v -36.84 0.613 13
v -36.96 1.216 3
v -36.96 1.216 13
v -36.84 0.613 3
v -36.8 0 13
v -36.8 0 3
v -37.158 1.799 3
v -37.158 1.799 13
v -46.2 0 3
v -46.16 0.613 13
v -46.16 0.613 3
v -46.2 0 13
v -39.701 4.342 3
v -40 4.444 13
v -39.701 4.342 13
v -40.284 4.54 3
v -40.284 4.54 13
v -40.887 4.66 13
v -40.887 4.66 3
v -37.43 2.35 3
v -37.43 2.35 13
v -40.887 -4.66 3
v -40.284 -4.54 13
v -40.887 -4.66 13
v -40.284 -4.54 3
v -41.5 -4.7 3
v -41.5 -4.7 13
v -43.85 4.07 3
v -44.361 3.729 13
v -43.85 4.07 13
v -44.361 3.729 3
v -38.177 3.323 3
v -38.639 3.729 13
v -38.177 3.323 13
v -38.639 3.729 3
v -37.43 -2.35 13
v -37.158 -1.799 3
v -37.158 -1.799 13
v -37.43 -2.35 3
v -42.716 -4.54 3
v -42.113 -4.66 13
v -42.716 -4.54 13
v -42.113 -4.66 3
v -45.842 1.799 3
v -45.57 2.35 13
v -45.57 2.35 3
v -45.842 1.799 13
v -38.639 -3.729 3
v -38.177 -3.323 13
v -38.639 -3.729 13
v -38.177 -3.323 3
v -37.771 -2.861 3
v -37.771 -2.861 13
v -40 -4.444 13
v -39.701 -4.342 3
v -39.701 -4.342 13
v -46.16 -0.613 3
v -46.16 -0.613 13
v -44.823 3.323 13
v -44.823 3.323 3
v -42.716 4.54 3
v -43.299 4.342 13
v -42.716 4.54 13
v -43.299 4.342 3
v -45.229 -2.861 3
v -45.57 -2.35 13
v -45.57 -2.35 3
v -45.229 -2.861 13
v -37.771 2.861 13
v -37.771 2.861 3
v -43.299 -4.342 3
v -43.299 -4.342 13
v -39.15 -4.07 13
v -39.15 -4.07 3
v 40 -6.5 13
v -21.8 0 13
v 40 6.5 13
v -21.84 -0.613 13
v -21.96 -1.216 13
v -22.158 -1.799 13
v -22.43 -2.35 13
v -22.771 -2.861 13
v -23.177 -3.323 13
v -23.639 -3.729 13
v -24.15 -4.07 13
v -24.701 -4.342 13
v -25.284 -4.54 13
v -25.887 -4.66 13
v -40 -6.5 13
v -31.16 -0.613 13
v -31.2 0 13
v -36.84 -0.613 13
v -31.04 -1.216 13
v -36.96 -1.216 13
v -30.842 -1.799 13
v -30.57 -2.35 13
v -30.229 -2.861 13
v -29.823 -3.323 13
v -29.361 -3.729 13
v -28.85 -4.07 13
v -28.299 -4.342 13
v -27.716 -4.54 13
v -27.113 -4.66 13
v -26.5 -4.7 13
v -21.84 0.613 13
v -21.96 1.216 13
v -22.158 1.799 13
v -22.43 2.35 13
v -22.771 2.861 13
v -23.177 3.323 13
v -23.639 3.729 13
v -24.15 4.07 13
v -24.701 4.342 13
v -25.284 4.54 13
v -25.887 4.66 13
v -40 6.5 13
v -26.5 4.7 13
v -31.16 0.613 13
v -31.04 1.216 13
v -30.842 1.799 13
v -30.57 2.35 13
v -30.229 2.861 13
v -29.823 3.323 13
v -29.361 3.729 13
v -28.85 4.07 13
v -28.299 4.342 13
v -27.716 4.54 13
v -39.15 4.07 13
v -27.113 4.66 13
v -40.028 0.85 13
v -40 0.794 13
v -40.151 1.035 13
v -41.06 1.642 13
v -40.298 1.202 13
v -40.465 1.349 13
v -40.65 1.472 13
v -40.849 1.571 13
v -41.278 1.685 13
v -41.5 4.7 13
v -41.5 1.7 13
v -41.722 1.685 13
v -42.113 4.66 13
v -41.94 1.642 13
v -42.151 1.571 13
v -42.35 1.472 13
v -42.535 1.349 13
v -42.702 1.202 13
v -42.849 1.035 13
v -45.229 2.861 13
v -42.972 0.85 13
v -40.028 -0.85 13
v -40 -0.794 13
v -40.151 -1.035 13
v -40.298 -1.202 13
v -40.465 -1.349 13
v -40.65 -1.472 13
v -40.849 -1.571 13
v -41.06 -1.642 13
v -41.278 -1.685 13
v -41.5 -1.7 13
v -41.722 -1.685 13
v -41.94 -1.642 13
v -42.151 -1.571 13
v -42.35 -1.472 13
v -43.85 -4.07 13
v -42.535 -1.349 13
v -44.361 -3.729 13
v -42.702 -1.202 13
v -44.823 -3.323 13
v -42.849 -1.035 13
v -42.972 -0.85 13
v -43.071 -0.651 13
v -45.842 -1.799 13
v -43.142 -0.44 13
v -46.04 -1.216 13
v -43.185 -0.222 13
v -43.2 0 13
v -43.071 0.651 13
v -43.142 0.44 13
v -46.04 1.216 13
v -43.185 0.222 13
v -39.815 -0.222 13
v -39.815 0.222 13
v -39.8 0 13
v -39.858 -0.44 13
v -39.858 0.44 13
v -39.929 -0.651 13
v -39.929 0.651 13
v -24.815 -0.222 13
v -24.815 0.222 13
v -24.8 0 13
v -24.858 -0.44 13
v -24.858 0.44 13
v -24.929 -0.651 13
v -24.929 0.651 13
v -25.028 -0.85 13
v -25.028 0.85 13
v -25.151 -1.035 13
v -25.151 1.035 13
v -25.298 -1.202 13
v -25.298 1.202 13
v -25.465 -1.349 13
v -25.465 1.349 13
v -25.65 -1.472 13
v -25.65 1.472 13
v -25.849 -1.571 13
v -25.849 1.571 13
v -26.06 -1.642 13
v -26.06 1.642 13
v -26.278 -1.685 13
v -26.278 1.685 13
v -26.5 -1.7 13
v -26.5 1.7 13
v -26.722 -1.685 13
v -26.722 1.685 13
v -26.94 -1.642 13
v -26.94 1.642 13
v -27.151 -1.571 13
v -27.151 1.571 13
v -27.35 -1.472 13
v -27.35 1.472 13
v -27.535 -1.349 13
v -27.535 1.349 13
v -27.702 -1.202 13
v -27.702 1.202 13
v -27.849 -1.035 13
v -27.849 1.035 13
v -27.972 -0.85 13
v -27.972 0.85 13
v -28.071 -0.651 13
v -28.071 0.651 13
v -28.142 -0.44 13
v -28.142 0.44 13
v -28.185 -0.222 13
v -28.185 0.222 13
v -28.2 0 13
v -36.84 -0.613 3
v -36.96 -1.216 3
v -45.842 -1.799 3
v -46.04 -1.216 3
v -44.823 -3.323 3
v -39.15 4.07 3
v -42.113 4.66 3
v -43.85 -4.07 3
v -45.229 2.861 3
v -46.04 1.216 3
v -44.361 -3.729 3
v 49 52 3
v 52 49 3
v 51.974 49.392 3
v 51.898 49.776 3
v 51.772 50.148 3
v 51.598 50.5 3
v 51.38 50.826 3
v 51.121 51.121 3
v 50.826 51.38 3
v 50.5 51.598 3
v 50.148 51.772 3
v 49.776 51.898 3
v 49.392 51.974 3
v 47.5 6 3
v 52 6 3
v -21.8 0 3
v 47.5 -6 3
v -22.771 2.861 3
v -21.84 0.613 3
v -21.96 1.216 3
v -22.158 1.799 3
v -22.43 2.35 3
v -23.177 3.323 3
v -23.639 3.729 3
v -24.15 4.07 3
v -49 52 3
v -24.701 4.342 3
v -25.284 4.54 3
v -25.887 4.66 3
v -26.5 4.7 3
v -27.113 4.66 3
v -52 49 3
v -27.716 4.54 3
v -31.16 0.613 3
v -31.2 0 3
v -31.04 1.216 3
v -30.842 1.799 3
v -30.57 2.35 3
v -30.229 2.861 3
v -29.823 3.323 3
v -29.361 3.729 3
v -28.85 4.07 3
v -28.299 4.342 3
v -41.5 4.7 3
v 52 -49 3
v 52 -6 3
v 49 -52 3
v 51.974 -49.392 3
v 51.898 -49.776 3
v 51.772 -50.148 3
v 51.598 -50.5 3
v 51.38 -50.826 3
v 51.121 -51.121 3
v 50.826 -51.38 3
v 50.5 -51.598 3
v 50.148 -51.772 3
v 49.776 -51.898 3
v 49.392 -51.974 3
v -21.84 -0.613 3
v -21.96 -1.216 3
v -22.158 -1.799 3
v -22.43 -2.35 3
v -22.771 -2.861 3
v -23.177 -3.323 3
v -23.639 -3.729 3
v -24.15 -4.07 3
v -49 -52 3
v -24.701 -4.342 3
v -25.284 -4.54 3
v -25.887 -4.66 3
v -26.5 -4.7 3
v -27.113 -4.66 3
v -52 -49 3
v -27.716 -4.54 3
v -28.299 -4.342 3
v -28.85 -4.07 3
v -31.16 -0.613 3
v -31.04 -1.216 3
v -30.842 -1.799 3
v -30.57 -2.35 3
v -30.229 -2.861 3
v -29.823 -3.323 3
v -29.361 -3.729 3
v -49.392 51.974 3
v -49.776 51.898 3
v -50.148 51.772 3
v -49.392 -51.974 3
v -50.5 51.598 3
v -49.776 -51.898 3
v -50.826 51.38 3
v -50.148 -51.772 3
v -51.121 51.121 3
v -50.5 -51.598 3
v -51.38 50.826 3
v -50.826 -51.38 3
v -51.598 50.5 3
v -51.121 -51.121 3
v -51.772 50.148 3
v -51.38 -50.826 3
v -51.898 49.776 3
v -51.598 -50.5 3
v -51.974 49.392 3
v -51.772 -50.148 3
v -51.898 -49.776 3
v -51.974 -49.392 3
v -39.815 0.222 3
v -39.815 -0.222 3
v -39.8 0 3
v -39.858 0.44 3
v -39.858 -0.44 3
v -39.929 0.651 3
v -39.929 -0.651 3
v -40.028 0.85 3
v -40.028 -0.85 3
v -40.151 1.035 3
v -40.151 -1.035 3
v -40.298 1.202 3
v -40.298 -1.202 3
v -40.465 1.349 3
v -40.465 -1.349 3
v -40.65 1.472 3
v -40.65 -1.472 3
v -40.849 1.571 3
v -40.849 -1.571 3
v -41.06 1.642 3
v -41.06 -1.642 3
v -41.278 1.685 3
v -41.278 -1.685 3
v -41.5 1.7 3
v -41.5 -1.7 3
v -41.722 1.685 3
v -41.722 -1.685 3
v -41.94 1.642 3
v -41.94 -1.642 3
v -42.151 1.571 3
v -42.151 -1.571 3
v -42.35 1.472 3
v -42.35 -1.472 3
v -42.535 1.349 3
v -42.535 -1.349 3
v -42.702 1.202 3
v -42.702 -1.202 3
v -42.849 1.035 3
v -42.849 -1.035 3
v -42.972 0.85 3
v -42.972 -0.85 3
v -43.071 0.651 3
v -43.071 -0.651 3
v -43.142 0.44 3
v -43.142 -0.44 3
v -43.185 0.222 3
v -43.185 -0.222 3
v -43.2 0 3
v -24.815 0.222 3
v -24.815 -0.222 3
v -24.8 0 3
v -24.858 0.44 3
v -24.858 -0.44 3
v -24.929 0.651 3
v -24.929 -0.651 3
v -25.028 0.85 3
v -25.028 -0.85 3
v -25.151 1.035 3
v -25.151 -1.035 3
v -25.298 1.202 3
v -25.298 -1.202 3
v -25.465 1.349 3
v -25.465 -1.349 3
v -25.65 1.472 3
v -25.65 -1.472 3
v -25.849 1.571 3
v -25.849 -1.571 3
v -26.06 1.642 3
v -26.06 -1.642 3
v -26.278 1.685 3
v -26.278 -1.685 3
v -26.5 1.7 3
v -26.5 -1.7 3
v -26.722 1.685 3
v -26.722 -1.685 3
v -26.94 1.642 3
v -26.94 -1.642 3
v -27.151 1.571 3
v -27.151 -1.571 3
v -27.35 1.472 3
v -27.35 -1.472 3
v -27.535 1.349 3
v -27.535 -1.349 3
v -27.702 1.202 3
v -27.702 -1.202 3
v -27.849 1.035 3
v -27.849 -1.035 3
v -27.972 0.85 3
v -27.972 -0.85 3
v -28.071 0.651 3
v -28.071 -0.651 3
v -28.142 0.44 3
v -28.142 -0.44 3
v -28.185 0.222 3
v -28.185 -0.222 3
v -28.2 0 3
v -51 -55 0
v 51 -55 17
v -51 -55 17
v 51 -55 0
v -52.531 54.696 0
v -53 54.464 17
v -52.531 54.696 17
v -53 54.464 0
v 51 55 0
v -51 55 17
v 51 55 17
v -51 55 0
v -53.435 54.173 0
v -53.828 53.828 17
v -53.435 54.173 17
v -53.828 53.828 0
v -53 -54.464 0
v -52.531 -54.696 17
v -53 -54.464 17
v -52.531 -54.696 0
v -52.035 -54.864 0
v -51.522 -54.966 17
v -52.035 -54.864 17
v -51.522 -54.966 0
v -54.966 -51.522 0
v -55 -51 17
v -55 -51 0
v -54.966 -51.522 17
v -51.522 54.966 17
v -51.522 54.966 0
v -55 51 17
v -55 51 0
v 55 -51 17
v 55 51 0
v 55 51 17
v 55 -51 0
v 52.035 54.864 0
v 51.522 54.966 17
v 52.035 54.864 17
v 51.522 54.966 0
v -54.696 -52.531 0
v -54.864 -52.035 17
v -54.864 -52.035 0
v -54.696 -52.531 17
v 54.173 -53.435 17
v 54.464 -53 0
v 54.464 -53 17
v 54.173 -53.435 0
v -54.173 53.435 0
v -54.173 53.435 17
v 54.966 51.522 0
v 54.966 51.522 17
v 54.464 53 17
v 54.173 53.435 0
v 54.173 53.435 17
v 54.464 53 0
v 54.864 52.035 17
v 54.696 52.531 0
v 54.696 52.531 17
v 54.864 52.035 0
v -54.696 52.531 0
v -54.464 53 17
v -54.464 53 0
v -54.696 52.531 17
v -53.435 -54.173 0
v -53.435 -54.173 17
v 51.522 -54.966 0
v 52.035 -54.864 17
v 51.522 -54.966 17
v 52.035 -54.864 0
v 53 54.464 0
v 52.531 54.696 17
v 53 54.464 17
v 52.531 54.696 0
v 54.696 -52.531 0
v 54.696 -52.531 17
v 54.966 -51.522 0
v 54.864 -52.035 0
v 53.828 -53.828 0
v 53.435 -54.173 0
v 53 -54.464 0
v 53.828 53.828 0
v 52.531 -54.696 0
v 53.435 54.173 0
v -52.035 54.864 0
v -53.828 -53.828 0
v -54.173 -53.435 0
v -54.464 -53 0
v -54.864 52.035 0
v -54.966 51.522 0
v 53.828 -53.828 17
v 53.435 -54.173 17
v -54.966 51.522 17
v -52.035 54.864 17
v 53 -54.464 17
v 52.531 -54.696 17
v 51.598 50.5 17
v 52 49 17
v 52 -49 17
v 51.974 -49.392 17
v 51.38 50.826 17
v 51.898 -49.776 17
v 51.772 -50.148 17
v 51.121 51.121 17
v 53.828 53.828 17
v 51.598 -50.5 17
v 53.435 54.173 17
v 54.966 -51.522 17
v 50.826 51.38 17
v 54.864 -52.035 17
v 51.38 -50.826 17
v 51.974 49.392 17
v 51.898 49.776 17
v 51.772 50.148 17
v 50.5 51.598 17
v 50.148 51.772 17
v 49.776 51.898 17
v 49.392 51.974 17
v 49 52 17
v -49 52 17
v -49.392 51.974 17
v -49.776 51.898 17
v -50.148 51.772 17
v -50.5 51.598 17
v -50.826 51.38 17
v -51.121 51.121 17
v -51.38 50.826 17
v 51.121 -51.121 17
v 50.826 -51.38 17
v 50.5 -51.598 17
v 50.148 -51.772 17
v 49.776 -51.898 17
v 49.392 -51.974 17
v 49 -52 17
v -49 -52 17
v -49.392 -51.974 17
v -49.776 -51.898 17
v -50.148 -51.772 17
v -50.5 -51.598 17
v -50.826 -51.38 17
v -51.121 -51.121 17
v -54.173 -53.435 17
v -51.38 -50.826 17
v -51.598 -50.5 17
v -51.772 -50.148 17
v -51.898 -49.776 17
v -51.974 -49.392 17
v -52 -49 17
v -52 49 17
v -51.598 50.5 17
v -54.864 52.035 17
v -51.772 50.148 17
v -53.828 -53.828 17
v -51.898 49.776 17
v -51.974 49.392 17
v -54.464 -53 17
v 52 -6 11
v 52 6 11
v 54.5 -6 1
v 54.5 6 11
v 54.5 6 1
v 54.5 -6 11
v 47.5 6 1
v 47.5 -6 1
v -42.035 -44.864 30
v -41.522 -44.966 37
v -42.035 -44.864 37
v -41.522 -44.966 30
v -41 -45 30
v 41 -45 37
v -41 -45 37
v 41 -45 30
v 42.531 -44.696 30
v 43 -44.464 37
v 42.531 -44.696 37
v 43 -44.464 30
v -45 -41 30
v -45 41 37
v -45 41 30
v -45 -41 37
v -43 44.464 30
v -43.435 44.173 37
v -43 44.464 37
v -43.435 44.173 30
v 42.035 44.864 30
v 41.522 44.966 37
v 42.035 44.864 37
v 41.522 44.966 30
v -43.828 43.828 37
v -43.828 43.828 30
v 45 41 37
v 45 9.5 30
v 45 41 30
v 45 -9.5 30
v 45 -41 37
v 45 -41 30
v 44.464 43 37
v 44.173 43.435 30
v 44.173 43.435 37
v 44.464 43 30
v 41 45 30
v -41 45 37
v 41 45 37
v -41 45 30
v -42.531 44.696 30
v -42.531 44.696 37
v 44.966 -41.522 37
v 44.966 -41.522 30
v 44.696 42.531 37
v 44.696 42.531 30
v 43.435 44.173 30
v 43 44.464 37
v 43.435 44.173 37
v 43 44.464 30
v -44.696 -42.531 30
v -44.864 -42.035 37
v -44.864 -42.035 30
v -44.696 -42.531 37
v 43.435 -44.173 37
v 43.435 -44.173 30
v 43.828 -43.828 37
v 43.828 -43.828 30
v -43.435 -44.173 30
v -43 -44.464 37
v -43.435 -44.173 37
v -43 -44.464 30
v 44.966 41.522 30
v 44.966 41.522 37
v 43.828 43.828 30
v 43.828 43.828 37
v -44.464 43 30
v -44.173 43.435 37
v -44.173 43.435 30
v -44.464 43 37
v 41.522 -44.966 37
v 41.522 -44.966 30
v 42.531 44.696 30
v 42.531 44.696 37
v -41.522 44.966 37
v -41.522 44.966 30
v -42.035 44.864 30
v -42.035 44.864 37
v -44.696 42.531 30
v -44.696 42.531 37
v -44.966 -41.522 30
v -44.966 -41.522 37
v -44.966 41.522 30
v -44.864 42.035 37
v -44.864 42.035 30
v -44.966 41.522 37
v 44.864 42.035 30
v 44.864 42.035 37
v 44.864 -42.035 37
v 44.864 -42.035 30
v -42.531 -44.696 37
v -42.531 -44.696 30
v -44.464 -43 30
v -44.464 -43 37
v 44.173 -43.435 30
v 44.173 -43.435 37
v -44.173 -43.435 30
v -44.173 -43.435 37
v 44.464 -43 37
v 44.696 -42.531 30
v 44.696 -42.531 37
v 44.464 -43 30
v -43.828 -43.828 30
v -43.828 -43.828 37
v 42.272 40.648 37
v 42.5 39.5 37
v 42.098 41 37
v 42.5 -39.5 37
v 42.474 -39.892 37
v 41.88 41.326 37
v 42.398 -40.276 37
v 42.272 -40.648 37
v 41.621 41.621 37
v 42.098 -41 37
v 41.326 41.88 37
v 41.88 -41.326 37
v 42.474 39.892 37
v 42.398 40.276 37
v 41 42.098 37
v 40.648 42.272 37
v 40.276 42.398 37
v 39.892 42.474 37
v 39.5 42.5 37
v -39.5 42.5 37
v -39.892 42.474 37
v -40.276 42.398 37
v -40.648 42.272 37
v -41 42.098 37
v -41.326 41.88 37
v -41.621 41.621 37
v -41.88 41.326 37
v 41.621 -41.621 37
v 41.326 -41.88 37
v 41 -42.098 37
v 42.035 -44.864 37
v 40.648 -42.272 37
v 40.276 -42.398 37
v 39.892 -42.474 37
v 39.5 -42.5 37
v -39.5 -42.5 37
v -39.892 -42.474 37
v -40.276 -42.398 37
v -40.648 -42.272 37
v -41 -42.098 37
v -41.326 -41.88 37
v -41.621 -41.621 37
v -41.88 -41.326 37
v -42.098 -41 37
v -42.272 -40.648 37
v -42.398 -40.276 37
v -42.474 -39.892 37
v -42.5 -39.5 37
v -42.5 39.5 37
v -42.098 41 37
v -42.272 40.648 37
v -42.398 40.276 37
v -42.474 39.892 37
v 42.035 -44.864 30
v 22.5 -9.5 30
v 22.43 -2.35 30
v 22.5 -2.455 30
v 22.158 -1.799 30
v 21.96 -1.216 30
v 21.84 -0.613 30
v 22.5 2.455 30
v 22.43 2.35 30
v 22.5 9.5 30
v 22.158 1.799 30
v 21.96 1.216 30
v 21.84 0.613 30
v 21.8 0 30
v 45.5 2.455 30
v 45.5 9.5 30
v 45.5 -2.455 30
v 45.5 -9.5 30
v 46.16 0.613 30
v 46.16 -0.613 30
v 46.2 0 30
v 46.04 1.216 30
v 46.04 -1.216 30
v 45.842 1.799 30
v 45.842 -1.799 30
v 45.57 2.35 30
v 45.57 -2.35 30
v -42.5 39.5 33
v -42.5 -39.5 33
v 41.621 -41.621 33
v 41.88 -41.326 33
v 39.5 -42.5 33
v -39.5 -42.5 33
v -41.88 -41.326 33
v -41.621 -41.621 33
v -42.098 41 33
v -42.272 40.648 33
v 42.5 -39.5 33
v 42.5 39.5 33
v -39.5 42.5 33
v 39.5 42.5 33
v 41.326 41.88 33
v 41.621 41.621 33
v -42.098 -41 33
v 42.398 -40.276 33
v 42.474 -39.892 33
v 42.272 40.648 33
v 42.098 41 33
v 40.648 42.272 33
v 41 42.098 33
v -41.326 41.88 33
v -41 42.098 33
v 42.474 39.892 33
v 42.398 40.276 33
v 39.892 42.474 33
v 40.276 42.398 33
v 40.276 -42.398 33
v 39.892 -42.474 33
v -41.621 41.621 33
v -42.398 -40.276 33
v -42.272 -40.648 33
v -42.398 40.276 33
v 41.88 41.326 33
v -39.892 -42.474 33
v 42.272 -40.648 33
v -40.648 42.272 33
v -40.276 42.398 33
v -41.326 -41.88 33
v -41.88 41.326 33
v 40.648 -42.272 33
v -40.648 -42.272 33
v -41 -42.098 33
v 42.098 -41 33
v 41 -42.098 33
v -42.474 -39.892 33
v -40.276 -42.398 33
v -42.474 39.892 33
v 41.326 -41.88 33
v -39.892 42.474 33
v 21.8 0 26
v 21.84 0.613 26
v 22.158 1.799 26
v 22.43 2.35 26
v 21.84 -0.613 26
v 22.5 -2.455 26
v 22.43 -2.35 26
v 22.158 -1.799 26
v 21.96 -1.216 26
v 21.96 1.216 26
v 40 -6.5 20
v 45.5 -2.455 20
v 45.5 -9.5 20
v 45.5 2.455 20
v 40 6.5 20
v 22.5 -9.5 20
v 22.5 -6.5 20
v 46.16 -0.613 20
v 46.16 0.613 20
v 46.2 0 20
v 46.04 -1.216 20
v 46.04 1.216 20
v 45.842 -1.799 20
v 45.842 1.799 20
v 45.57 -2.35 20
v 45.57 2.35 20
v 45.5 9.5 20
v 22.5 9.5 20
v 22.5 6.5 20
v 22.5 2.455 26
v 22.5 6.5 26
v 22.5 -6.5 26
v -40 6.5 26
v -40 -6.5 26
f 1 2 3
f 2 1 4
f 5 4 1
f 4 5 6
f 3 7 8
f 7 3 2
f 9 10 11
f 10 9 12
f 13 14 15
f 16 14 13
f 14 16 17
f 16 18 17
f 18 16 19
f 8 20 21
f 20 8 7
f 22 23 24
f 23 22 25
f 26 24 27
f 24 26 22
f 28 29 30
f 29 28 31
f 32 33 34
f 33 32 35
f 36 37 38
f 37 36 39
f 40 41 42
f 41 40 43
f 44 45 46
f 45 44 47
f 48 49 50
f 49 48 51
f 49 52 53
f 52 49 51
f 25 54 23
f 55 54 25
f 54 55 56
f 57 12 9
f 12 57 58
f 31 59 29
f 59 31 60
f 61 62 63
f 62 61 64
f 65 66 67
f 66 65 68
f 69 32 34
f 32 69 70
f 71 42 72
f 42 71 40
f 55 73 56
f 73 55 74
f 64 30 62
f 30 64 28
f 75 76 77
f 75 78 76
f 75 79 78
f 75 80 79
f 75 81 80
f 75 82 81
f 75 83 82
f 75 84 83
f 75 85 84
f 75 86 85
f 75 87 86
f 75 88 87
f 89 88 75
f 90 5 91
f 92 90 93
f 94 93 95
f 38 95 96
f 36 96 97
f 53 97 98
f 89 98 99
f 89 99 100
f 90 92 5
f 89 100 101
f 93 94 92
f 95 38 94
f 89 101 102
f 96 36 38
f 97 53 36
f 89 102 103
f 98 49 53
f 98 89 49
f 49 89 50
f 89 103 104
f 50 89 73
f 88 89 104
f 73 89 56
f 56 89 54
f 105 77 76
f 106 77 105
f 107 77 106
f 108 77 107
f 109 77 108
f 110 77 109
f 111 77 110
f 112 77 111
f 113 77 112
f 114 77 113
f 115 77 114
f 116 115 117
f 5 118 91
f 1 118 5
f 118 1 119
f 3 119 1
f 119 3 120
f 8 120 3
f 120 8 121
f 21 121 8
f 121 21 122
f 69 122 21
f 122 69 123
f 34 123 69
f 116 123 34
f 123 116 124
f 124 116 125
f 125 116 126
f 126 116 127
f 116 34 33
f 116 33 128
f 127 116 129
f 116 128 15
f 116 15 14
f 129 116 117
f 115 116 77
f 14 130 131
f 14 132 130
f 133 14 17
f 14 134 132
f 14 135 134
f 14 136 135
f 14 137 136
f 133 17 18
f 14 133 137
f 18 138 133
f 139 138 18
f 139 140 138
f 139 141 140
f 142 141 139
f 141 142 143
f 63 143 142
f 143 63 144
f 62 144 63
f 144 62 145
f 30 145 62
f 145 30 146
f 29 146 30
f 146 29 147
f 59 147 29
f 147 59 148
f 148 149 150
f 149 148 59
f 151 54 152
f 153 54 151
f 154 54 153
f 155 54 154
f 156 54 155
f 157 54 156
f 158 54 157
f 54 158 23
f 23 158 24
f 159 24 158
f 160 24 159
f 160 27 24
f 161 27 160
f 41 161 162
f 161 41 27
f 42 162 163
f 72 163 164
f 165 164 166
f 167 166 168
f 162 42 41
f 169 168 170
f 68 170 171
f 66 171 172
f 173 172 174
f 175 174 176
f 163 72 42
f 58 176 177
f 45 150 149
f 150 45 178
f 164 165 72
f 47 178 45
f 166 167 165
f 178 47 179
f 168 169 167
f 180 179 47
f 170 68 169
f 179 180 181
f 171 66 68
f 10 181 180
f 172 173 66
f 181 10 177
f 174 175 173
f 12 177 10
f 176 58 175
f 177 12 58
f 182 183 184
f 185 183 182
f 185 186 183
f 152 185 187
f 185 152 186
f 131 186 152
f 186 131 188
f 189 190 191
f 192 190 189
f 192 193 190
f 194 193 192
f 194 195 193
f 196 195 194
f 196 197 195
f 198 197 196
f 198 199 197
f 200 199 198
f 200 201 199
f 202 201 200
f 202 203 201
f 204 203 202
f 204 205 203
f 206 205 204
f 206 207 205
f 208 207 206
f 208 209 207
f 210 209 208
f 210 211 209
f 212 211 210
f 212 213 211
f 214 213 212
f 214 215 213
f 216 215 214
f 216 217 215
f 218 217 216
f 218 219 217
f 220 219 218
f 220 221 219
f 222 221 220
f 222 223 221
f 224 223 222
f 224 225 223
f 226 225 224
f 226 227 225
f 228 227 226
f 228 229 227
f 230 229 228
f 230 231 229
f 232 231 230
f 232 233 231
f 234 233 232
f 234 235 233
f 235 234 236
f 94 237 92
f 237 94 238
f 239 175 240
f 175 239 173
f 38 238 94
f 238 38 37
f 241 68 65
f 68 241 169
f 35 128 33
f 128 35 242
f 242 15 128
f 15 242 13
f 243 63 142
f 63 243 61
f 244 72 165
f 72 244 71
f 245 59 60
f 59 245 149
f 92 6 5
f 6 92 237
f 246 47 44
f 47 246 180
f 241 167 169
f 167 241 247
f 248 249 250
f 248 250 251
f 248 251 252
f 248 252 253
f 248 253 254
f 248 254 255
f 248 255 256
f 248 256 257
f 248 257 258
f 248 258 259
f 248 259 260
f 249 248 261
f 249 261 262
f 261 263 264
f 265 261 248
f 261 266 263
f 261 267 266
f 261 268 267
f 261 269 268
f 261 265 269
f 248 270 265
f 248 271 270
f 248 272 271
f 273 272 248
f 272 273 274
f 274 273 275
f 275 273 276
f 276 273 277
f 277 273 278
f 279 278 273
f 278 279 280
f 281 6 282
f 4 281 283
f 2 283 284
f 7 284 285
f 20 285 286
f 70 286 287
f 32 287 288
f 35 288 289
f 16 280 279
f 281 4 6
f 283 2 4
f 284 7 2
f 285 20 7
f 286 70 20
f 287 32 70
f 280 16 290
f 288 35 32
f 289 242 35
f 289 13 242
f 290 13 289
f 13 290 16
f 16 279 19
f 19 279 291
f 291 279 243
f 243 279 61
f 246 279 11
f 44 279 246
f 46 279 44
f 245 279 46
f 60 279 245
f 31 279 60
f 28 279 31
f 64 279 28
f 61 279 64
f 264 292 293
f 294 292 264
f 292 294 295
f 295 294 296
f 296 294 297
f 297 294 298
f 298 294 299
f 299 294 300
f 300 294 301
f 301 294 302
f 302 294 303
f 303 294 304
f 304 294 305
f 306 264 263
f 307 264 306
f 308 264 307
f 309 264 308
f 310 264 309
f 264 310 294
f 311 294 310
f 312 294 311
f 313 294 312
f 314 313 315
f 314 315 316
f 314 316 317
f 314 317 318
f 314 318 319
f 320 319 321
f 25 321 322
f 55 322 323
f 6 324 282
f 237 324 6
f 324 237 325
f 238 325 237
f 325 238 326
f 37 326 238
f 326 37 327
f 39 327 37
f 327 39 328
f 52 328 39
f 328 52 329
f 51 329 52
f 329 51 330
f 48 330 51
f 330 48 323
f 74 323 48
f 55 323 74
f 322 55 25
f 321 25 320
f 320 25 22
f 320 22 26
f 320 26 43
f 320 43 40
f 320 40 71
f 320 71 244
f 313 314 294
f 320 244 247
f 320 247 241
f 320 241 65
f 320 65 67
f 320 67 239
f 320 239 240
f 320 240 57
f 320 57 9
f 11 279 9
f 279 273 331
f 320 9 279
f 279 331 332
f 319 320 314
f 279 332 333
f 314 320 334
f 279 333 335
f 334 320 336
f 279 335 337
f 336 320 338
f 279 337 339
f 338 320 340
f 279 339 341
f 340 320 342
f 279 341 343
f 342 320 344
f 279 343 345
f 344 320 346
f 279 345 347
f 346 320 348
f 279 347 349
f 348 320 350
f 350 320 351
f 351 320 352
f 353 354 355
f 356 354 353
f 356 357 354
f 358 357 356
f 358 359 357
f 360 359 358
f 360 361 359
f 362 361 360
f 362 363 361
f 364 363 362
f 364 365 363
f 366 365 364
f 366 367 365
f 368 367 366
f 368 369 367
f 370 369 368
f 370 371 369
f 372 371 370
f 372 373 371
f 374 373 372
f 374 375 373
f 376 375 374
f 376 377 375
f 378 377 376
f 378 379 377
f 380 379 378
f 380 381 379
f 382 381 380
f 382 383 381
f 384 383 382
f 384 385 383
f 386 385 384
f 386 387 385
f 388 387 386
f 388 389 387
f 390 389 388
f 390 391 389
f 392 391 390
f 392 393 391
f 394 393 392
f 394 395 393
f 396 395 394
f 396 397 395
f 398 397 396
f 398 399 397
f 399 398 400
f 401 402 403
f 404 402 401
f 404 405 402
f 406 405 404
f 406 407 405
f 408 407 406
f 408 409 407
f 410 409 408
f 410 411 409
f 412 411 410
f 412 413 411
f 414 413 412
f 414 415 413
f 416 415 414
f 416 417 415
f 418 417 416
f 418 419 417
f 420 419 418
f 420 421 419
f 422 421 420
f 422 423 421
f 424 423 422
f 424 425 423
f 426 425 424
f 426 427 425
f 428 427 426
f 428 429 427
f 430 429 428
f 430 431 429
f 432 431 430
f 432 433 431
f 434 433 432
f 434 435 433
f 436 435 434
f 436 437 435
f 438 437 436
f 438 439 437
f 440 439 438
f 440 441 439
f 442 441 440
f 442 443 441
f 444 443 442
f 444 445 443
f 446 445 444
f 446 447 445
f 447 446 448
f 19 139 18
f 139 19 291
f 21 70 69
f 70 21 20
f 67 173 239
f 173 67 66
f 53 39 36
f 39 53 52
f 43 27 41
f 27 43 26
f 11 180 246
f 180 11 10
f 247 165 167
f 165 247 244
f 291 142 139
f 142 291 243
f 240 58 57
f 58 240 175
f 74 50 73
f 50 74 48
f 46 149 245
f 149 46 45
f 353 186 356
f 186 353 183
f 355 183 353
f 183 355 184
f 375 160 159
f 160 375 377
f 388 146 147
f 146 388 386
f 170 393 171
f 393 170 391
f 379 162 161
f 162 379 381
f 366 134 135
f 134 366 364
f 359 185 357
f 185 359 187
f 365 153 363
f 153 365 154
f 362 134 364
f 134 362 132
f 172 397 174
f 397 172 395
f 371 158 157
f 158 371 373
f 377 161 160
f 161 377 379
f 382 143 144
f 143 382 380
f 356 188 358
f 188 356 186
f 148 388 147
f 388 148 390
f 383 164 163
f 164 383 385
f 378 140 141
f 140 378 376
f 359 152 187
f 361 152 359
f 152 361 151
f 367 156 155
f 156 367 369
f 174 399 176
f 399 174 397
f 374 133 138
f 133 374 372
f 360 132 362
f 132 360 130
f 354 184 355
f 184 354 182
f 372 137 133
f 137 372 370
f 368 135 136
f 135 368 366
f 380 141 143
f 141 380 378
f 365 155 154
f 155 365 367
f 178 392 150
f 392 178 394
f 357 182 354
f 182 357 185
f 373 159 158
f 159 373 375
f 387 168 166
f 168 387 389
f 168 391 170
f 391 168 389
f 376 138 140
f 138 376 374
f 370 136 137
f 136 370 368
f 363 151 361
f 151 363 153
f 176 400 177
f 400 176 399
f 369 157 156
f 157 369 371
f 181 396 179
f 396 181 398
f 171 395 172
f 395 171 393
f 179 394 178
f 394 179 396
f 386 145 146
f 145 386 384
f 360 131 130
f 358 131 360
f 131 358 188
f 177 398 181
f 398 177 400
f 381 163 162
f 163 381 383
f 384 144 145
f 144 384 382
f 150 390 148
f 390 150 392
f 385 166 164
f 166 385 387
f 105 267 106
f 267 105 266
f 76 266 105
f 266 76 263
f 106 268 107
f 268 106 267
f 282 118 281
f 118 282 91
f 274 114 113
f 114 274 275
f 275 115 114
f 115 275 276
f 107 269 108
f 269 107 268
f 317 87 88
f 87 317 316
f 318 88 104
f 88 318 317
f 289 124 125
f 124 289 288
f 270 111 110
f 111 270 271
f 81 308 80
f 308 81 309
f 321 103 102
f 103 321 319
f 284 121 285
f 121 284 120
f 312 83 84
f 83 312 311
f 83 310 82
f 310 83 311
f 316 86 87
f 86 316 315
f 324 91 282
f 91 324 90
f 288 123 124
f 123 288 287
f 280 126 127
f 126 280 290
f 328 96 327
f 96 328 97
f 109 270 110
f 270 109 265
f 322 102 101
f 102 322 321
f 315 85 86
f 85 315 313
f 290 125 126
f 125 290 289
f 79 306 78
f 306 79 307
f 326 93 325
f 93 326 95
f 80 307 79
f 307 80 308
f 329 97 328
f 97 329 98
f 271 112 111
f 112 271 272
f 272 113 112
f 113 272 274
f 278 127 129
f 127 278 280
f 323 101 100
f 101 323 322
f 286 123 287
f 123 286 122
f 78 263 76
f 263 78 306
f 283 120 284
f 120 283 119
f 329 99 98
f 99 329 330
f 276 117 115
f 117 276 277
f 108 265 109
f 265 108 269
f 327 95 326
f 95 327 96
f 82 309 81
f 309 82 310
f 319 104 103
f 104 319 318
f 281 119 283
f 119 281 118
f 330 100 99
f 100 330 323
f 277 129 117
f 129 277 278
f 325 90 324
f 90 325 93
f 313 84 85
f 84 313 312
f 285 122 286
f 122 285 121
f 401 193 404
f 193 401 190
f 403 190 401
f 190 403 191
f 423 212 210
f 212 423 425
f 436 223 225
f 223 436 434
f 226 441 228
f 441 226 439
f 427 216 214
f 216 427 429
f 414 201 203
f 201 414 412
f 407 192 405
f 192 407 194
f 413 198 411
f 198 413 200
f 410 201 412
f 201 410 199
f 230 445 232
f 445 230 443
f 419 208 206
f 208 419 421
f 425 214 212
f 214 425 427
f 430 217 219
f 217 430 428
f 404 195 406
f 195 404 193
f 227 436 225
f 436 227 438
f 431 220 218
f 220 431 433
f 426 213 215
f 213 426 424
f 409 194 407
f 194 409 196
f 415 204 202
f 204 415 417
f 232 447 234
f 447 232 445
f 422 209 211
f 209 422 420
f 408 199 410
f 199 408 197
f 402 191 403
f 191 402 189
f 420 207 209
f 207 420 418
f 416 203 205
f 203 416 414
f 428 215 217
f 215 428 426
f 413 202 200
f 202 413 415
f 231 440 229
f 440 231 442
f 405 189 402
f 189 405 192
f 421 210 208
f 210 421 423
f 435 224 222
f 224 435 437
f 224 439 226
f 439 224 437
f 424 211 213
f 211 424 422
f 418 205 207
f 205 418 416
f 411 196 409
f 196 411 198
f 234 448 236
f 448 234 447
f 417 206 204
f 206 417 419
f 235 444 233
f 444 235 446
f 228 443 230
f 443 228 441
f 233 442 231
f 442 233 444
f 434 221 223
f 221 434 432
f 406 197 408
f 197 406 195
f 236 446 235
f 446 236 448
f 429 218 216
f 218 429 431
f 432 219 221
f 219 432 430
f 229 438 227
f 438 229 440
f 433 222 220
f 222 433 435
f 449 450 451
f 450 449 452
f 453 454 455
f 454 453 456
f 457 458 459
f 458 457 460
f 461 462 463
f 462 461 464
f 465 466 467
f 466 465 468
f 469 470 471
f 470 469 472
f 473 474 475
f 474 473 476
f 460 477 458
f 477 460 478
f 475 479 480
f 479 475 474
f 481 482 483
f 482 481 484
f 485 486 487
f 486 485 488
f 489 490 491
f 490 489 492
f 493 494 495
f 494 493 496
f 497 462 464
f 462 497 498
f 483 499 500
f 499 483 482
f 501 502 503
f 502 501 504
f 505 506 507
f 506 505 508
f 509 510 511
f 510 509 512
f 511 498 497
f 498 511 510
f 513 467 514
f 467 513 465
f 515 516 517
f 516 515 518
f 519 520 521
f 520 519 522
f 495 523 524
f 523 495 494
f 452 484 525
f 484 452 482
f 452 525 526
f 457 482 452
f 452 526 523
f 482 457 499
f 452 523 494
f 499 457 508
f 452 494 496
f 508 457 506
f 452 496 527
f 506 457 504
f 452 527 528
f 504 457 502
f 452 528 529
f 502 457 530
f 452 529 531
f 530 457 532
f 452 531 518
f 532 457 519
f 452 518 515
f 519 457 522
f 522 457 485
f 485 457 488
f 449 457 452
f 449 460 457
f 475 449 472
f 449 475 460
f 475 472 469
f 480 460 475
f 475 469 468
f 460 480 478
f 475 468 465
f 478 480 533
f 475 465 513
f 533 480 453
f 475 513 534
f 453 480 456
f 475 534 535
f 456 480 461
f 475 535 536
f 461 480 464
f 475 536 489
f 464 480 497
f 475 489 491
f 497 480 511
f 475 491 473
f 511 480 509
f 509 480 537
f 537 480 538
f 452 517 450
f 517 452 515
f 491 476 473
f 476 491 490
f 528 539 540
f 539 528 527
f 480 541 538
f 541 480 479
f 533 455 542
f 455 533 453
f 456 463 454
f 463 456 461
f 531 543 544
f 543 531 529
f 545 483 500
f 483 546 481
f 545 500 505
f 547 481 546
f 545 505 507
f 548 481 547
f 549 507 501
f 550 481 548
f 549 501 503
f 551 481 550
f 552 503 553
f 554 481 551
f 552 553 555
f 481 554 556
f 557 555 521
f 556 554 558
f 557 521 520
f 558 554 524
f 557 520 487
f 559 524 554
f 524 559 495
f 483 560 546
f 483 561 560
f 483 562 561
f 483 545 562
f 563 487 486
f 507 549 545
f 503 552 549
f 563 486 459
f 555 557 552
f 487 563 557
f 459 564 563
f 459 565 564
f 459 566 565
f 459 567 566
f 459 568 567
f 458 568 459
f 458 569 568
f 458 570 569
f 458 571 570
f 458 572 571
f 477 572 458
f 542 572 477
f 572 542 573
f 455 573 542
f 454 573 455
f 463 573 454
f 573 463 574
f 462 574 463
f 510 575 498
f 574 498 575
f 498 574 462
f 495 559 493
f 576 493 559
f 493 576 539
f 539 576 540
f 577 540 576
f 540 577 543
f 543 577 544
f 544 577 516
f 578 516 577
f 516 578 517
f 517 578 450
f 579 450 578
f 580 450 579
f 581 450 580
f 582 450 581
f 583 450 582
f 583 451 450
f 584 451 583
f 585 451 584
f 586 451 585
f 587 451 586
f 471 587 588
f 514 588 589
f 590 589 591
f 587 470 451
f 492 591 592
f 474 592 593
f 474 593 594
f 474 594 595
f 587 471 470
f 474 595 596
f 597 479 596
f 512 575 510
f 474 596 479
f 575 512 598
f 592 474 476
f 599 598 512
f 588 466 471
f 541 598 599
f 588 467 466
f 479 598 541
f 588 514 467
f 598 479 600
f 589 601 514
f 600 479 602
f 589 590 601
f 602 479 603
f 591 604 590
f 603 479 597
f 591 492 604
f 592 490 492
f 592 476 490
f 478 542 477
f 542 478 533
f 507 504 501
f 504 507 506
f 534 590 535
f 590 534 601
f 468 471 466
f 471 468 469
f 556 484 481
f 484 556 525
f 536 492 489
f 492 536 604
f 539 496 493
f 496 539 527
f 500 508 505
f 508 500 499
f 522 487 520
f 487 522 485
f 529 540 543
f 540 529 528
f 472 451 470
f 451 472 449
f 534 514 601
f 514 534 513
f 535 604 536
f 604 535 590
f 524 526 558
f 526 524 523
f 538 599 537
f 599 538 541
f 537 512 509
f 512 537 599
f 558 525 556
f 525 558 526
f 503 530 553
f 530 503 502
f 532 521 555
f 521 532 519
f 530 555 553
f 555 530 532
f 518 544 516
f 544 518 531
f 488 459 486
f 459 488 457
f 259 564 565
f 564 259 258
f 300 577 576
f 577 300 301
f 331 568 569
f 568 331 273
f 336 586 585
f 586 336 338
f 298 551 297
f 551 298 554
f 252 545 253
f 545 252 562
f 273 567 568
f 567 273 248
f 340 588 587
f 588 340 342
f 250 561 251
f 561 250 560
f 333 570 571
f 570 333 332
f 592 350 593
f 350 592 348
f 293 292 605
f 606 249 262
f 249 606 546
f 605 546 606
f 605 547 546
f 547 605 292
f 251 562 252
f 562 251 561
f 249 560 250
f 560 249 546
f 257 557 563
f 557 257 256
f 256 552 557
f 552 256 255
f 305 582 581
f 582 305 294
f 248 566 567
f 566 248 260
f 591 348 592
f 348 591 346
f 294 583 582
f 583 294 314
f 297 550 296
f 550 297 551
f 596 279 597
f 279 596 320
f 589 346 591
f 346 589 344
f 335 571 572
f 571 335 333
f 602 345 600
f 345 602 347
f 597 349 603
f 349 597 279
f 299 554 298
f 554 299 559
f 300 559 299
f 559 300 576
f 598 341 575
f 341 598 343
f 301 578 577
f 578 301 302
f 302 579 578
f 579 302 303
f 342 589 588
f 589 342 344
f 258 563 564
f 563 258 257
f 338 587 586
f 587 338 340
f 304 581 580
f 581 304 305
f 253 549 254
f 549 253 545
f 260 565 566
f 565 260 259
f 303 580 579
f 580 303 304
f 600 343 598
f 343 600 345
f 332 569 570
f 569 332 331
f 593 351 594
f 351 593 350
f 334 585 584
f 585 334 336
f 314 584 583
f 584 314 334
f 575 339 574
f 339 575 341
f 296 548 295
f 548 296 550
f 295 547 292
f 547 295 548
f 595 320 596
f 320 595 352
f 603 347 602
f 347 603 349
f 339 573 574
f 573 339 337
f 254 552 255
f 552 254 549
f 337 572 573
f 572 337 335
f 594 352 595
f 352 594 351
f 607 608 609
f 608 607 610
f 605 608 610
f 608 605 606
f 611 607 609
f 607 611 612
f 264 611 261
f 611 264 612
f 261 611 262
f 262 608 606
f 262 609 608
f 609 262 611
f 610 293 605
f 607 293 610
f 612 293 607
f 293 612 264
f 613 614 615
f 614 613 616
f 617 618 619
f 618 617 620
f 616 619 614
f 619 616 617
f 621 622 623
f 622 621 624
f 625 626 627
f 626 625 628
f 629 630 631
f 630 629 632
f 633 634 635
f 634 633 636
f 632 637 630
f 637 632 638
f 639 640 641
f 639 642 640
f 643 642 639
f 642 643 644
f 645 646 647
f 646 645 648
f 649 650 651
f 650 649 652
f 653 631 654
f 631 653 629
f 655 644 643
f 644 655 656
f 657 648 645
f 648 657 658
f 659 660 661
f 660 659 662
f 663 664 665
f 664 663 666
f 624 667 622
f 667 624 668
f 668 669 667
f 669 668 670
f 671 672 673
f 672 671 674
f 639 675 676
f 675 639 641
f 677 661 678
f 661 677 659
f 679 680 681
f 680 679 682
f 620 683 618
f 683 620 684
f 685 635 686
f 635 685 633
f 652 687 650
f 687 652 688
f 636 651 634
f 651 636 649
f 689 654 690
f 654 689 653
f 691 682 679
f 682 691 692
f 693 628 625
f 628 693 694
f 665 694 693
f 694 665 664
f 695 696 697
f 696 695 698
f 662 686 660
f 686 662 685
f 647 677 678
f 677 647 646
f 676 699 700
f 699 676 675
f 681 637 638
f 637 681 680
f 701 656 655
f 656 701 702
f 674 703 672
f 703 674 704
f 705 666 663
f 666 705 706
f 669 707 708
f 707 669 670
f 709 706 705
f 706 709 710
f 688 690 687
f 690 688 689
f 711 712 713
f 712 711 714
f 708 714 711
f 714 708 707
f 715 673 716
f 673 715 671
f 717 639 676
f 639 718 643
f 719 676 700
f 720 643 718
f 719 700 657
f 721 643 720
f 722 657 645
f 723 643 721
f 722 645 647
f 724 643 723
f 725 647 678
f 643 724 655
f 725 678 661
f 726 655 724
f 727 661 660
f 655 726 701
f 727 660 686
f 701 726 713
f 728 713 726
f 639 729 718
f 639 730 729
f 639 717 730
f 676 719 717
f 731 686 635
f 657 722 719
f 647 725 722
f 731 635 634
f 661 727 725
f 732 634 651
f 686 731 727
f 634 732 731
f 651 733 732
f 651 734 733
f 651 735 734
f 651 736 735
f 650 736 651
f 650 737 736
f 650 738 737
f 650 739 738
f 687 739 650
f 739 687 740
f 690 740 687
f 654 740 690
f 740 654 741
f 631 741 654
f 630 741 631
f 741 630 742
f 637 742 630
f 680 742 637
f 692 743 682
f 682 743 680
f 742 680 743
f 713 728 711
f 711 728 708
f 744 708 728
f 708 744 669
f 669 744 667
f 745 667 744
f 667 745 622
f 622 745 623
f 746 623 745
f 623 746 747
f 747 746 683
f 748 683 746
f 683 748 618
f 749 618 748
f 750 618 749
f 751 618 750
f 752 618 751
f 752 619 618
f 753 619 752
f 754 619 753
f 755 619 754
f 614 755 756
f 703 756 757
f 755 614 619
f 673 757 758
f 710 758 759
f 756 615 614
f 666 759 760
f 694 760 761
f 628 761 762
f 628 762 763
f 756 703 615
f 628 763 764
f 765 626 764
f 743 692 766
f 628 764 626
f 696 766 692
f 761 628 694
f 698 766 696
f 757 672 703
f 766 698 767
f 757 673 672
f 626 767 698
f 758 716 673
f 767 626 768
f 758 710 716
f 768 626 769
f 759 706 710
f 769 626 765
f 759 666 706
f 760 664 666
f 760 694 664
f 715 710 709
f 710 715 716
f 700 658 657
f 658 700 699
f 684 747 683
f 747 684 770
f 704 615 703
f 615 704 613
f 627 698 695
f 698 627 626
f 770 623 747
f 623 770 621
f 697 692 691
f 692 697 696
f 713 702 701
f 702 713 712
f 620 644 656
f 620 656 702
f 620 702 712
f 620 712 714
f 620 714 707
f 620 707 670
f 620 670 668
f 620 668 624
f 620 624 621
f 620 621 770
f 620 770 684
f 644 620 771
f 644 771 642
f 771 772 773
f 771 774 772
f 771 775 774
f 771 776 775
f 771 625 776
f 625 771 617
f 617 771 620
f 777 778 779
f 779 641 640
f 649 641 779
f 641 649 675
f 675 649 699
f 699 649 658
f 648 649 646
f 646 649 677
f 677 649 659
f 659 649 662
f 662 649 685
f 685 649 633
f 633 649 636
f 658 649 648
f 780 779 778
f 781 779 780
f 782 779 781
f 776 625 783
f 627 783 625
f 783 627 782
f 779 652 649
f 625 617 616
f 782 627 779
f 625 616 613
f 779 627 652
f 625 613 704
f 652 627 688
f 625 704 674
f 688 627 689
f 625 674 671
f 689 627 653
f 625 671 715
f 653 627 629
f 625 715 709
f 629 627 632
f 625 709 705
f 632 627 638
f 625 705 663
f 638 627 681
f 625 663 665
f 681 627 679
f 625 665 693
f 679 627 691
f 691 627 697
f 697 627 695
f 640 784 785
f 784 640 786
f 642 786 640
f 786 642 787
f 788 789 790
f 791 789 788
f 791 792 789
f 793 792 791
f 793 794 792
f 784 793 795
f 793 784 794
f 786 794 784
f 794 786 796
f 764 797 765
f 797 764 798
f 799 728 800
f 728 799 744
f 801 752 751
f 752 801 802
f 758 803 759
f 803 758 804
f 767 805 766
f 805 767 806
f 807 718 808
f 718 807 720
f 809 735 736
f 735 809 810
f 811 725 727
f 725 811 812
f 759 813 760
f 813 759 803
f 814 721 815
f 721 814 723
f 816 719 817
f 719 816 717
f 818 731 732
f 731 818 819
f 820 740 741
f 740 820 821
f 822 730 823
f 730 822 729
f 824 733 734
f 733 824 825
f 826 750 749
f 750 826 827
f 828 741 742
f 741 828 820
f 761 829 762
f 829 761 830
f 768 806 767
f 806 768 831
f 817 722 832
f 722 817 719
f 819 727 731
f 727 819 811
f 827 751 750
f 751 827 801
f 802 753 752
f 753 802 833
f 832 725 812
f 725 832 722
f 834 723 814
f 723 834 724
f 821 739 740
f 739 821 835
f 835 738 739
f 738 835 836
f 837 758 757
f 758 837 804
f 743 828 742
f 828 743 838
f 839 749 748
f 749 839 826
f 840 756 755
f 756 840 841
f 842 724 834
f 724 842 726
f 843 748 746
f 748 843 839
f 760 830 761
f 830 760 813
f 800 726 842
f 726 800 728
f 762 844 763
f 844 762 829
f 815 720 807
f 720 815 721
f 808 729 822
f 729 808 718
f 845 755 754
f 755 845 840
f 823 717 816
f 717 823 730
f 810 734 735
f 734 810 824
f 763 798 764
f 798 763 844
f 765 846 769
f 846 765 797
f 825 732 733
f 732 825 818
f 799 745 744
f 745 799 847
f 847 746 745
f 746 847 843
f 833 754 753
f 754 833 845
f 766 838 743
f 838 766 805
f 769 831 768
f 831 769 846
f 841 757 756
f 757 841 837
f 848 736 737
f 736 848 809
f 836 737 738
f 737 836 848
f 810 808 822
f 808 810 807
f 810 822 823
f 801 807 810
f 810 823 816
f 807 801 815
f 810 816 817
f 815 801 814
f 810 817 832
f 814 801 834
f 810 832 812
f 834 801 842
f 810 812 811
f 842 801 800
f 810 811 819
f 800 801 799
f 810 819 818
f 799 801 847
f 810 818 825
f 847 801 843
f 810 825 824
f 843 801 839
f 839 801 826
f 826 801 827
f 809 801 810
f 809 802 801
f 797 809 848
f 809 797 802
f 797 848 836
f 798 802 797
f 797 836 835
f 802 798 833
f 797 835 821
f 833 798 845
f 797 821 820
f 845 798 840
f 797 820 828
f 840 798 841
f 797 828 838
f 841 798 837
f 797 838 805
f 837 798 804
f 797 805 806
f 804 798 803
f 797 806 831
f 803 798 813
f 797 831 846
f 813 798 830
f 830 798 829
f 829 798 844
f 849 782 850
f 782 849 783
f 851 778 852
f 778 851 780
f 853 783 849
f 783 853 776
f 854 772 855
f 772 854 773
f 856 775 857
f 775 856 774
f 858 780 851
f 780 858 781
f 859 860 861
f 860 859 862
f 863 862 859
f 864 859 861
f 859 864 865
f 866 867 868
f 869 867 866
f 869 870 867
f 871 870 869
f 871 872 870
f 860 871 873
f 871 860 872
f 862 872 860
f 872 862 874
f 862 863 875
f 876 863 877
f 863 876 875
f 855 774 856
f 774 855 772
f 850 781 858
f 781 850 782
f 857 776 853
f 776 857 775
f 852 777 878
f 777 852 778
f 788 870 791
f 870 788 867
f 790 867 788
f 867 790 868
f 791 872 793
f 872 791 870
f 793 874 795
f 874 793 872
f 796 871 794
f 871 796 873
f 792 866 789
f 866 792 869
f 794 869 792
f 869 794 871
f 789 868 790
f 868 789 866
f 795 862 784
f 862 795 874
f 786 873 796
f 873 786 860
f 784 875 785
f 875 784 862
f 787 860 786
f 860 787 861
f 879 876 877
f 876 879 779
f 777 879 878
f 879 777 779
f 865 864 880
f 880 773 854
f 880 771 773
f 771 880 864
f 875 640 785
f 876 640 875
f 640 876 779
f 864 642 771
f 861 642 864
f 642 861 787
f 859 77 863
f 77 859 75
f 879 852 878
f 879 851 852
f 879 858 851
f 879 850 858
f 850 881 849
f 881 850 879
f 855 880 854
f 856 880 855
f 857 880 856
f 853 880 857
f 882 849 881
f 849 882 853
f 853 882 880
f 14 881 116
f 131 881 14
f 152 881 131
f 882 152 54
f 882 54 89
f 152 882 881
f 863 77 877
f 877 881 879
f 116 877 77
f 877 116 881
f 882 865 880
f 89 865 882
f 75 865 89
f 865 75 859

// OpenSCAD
// =============================================================================
// Bottle Feed Logger — load-cell stand (parametric starter)
//
// Two parts: BASE (fixed end of the load cell + electronics) and
// PLATFORM (free end of the load cell; the bottle sits here).
// The load cell is mounted CANTILEVER-style with an air gap so it can flex.
//
// HOW TO USE:
//   1. Measure your load cell and set the parameters below.
//   2. Set part = "base" or "platform" (or "preview" to see both).
//   3. Render (F6) and export each STL.
//
// This is a starting point — tweak to fit your exact cell and bottle.
// The critical requirement is the AIR GAP so the cell can bend.
// See hardware/assembly.md.
// =============================================================================

// ---------------- WHICH PART TO RENDER ----------------
part = "preview";   // "base", "platform", or "preview"

// ---------------- LOAD CELL DIMENSIONS (MEASURE YOURS) ----------------
cell_length       = 80;   // mm, length of the bar
cell_width        = 13;   // mm
cell_height       = 13;   // mm
cell_hole_spacing = 15;   // mm, distance between the two holes at EACH end
cell_hole_dia     = 3.4;  // mm, screw clearance (kit uses M3 -> 3.4; M4 ~4.5, M5 ~5.5)
cell_end_inset    = 6;    // mm, how far the hole centers sit from each end

// ---------------- STAND DIMENSIONS ----------------
platform_size = 90;   // mm, square top the bottle sits on
base_size     = 110;  // mm, square footprint of the base
wall          = 3;    // mm
base_floor    = 3;    // mm
boss_h        = 10;   // mm, height of the mounting bosses under each cell end
air_gap       = 4;    // mm, clearance under the free (platform) end so it can flex
lip_h         = 4;    // mm, raised lip around the platform to catch drips
lip_w         = 2.5;  // mm

// ---------------- DERIVED ----------------
$fn = 48;

// Mounting boss with a screw hole, centered, for one END of the cell
module cell_end_bosses(z) {
    for (x = [-cell_hole_spacing/2, cell_hole_spacing/2]) {
        translate([x, 0, z])
            difference() {
                cylinder(h = boss_h, d = cell_hole_dia + 6);
                translate([0,0,-1])
                    cylinder(h = boss_h + 2, d = cell_hole_dia);
            }
    }
}

// ---------------- BASE ----------------
// Holds the FIXED end of the load cell + a cavity for electronics.
module base() {
    fixed_end_x = -cell_length/2 + cell_end_inset;

    difference() {
        union() {
            // base plate
            translate([0,0,0])
                roundedBox(base_size, base_size, base_floor, 4);
            // bosses for the fixed end of the cell
            translate([fixed_end_x, 0, base_floor])
                cell_end_bosses(0);
            // low side walls forming a shallow electronics tray
            difference() {
                translate([0,0,0]) roundedBox(base_size, base_size, base_floor + 14, 4);
                translate([0,0,base_floor])
                    roundedBox(base_size - 2*wall, base_size - 2*wall, 20, 3);
            }
        }
        // wire/cable channel out one side
        translate([base_size/2 - wall - 1, 0, base_floor + 3])
            cube([wall + 4, 12, 10], center = true);
    }
}

// ---------------- PLATFORM ----------------
// Attaches to the FREE end of the load cell; the bottle sits on top.
module platform() {
    free_end_x = cell_length/2 - cell_end_inset;

    union() {
        // platform plate
        difference() {
            roundedBox(platform_size, platform_size, wall, 4);
            // (optional) nothing cut for now
        }
        // drip lip around the edge
        difference() {
            roundedBox(platform_size, platform_size, wall + lip_h, 4);
            translate([0,0,wall])
                roundedBox(platform_size - 2*lip_w, platform_size - 2*lip_w, lip_h + 1, 3);
        }
        // downward bosses that reach the free end of the cell
        translate([free_end_x, 0, -boss_h])
            cell_end_bosses(0);
        // connecting rib from platform down to the bosses
        translate([free_end_x, 0, -boss_h/2])
            cube([cell_hole_spacing + 8, cell_width + 6, boss_h], center = true);
    }
}

// rounded box helper
module roundedBox(x, y, z, r) {
    hull() {
        for (sx = [-1,1], sy = [-1,1])
            translate([sx*(x/2 - r), sy*(y/2 - r), 0])
                cylinder(h = z, r = r);
    }
}

// ---------------- ASSEMBLY / PREVIEW ----------------
module preview() {
    color("LightSteelBlue") base();
    // platform floated above with the air gap, as it would sit in use
    translate([0,0, base_floor + boss_h + cell_height + air_gap])
        color("Khaki") platform();
    // representation of the load cell (not printed)
    color("Silver")
        translate([0,0, base_floor + boss_h + cell_height/2])
            cube([cell_length, cell_width, cell_height], center = true);
}

if (part == "base")          base();
else if (part == "platform") platform();
else                         preview();

// =============================================================================
// NOTES
// - The cantilever: fixed end bolts to the BASE bosses, free end bolts to the
//   PLATFORM bosses. The air_gap keeps the platform from touching the base so
//   the bar can flex. If anything binds, increase air_gap.
// - Verify hole spacing/diameter against YOUR cell before printing.
// - Print base bottom-down and platform top-down for clean surfaces.
// - Add a silicone coaster on the platform for a wipeable, food-friendly top.
// =============================================================================
